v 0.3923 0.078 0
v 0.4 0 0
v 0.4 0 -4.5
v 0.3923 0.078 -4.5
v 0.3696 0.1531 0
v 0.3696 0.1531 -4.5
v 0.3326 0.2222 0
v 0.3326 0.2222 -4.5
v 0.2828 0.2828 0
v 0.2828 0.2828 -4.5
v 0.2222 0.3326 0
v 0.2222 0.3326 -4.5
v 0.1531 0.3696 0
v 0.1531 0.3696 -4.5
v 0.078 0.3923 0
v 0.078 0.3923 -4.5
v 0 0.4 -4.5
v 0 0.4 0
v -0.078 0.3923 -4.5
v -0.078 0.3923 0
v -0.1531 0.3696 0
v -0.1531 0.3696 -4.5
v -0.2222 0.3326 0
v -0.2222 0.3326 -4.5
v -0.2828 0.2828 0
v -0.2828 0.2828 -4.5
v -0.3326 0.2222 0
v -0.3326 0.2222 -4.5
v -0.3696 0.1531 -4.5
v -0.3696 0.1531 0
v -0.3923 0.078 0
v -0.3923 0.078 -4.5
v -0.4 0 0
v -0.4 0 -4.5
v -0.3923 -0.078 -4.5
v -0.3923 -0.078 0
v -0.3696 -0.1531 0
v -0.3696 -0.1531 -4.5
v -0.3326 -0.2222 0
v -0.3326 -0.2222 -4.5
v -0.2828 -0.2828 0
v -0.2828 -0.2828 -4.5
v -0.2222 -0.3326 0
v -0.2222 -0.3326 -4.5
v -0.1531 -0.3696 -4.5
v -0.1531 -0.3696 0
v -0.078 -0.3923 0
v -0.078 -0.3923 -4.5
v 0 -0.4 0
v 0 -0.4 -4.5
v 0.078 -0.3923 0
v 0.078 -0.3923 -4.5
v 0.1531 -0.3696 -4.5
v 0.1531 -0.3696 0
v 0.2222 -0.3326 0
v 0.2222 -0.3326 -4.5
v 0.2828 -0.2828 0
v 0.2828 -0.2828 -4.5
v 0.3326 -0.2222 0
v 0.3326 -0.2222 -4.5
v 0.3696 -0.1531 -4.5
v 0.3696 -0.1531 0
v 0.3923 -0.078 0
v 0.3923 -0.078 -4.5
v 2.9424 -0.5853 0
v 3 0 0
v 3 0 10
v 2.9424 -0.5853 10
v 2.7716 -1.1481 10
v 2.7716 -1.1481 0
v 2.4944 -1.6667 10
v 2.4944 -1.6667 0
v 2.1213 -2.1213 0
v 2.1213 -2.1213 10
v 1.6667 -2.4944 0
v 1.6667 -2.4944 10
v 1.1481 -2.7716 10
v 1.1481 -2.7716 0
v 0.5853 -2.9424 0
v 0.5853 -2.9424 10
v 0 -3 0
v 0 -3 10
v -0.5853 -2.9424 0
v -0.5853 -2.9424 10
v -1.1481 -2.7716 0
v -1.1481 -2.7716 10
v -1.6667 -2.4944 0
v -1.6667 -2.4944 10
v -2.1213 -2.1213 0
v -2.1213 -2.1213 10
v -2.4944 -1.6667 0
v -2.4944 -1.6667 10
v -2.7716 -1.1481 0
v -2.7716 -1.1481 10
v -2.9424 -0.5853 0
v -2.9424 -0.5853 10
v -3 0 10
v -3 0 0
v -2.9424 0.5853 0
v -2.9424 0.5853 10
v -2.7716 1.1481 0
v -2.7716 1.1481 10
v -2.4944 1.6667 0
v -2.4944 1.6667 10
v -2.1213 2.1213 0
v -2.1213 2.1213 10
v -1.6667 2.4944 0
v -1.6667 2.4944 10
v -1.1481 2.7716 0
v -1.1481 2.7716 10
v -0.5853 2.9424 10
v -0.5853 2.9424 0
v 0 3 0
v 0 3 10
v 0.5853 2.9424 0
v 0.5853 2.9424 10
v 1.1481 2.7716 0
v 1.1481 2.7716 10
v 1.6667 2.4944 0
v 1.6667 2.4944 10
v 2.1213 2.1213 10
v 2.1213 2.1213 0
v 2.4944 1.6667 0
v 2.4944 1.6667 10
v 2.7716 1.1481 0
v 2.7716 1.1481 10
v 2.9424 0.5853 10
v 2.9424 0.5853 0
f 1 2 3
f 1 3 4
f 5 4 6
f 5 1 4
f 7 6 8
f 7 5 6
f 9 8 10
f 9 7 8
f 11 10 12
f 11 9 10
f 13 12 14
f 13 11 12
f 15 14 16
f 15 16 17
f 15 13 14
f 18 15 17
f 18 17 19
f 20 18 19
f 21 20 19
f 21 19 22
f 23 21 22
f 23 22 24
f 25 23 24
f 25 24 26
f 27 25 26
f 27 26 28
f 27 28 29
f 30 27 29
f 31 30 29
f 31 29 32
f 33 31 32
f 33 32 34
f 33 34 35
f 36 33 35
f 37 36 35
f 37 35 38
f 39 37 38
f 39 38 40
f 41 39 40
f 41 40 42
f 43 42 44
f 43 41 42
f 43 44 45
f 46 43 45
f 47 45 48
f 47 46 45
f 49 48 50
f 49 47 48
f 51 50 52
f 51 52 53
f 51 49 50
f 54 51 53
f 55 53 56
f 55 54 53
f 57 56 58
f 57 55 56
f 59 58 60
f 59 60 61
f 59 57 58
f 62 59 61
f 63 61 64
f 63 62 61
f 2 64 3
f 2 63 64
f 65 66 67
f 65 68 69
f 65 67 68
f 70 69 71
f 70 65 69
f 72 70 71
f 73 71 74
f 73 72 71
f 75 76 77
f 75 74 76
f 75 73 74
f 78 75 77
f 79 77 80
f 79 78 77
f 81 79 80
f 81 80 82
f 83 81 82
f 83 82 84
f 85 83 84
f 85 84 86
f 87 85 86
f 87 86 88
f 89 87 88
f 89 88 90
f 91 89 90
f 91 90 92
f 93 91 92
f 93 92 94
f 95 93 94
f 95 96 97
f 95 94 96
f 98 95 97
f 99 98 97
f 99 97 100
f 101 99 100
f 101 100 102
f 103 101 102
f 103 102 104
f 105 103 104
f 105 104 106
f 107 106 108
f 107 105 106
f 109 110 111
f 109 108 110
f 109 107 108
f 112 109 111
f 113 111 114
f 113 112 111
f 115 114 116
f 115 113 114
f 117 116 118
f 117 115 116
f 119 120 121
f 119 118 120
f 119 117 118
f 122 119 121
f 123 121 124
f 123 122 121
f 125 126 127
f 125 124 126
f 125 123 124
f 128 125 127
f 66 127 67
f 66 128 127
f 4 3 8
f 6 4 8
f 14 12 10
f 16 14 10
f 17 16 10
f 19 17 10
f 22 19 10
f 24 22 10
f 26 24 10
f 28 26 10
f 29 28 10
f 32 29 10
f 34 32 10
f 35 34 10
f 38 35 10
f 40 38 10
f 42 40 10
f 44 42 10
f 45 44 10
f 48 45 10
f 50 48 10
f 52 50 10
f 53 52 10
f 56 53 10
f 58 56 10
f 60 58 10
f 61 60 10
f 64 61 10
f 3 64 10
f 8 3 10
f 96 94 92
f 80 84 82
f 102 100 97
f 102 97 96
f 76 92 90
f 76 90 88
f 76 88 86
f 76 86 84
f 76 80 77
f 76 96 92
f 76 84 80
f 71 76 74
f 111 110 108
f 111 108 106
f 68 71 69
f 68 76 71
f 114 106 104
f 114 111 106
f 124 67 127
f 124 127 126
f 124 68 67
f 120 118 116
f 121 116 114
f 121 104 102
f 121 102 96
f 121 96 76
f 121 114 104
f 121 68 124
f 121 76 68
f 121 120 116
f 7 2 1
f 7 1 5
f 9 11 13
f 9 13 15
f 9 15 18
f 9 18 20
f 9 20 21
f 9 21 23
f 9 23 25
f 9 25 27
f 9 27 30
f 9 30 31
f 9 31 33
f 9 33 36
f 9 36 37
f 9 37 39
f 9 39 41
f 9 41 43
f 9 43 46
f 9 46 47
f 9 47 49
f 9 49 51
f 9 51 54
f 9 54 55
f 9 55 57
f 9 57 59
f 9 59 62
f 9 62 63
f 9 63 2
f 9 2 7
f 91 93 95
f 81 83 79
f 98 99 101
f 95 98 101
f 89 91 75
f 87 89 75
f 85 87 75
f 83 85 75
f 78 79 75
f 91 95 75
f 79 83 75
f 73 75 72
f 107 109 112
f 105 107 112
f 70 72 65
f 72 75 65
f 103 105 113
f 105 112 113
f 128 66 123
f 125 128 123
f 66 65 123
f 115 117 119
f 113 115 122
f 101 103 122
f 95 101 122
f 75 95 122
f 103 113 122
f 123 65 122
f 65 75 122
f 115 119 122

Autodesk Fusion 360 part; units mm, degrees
sketch "スケッチ1" plane through (0, 0, 0) normal (0, 0, 1) x (1, 0, 0)
  circle A0 centre (0, 0) radius 3
  circle A1 centre (0, 0) radius 0.4
  dimension "d1" = 6
  dimension "d7" = 0.8
extrude "押し出し1" add sketch "スケッチ1" along normal blind 10 contours A0 | A1 makes body 1
extrude "押し出し1'" add sketch "スケッチ1" against normal blind 4.5 separate body contours A1 makes body 2 in component "Component'"
component "Component'" placed x (1, 0, 0) y (0, 1, 0) z (0, 0, 1) at (0, 0, 0)
